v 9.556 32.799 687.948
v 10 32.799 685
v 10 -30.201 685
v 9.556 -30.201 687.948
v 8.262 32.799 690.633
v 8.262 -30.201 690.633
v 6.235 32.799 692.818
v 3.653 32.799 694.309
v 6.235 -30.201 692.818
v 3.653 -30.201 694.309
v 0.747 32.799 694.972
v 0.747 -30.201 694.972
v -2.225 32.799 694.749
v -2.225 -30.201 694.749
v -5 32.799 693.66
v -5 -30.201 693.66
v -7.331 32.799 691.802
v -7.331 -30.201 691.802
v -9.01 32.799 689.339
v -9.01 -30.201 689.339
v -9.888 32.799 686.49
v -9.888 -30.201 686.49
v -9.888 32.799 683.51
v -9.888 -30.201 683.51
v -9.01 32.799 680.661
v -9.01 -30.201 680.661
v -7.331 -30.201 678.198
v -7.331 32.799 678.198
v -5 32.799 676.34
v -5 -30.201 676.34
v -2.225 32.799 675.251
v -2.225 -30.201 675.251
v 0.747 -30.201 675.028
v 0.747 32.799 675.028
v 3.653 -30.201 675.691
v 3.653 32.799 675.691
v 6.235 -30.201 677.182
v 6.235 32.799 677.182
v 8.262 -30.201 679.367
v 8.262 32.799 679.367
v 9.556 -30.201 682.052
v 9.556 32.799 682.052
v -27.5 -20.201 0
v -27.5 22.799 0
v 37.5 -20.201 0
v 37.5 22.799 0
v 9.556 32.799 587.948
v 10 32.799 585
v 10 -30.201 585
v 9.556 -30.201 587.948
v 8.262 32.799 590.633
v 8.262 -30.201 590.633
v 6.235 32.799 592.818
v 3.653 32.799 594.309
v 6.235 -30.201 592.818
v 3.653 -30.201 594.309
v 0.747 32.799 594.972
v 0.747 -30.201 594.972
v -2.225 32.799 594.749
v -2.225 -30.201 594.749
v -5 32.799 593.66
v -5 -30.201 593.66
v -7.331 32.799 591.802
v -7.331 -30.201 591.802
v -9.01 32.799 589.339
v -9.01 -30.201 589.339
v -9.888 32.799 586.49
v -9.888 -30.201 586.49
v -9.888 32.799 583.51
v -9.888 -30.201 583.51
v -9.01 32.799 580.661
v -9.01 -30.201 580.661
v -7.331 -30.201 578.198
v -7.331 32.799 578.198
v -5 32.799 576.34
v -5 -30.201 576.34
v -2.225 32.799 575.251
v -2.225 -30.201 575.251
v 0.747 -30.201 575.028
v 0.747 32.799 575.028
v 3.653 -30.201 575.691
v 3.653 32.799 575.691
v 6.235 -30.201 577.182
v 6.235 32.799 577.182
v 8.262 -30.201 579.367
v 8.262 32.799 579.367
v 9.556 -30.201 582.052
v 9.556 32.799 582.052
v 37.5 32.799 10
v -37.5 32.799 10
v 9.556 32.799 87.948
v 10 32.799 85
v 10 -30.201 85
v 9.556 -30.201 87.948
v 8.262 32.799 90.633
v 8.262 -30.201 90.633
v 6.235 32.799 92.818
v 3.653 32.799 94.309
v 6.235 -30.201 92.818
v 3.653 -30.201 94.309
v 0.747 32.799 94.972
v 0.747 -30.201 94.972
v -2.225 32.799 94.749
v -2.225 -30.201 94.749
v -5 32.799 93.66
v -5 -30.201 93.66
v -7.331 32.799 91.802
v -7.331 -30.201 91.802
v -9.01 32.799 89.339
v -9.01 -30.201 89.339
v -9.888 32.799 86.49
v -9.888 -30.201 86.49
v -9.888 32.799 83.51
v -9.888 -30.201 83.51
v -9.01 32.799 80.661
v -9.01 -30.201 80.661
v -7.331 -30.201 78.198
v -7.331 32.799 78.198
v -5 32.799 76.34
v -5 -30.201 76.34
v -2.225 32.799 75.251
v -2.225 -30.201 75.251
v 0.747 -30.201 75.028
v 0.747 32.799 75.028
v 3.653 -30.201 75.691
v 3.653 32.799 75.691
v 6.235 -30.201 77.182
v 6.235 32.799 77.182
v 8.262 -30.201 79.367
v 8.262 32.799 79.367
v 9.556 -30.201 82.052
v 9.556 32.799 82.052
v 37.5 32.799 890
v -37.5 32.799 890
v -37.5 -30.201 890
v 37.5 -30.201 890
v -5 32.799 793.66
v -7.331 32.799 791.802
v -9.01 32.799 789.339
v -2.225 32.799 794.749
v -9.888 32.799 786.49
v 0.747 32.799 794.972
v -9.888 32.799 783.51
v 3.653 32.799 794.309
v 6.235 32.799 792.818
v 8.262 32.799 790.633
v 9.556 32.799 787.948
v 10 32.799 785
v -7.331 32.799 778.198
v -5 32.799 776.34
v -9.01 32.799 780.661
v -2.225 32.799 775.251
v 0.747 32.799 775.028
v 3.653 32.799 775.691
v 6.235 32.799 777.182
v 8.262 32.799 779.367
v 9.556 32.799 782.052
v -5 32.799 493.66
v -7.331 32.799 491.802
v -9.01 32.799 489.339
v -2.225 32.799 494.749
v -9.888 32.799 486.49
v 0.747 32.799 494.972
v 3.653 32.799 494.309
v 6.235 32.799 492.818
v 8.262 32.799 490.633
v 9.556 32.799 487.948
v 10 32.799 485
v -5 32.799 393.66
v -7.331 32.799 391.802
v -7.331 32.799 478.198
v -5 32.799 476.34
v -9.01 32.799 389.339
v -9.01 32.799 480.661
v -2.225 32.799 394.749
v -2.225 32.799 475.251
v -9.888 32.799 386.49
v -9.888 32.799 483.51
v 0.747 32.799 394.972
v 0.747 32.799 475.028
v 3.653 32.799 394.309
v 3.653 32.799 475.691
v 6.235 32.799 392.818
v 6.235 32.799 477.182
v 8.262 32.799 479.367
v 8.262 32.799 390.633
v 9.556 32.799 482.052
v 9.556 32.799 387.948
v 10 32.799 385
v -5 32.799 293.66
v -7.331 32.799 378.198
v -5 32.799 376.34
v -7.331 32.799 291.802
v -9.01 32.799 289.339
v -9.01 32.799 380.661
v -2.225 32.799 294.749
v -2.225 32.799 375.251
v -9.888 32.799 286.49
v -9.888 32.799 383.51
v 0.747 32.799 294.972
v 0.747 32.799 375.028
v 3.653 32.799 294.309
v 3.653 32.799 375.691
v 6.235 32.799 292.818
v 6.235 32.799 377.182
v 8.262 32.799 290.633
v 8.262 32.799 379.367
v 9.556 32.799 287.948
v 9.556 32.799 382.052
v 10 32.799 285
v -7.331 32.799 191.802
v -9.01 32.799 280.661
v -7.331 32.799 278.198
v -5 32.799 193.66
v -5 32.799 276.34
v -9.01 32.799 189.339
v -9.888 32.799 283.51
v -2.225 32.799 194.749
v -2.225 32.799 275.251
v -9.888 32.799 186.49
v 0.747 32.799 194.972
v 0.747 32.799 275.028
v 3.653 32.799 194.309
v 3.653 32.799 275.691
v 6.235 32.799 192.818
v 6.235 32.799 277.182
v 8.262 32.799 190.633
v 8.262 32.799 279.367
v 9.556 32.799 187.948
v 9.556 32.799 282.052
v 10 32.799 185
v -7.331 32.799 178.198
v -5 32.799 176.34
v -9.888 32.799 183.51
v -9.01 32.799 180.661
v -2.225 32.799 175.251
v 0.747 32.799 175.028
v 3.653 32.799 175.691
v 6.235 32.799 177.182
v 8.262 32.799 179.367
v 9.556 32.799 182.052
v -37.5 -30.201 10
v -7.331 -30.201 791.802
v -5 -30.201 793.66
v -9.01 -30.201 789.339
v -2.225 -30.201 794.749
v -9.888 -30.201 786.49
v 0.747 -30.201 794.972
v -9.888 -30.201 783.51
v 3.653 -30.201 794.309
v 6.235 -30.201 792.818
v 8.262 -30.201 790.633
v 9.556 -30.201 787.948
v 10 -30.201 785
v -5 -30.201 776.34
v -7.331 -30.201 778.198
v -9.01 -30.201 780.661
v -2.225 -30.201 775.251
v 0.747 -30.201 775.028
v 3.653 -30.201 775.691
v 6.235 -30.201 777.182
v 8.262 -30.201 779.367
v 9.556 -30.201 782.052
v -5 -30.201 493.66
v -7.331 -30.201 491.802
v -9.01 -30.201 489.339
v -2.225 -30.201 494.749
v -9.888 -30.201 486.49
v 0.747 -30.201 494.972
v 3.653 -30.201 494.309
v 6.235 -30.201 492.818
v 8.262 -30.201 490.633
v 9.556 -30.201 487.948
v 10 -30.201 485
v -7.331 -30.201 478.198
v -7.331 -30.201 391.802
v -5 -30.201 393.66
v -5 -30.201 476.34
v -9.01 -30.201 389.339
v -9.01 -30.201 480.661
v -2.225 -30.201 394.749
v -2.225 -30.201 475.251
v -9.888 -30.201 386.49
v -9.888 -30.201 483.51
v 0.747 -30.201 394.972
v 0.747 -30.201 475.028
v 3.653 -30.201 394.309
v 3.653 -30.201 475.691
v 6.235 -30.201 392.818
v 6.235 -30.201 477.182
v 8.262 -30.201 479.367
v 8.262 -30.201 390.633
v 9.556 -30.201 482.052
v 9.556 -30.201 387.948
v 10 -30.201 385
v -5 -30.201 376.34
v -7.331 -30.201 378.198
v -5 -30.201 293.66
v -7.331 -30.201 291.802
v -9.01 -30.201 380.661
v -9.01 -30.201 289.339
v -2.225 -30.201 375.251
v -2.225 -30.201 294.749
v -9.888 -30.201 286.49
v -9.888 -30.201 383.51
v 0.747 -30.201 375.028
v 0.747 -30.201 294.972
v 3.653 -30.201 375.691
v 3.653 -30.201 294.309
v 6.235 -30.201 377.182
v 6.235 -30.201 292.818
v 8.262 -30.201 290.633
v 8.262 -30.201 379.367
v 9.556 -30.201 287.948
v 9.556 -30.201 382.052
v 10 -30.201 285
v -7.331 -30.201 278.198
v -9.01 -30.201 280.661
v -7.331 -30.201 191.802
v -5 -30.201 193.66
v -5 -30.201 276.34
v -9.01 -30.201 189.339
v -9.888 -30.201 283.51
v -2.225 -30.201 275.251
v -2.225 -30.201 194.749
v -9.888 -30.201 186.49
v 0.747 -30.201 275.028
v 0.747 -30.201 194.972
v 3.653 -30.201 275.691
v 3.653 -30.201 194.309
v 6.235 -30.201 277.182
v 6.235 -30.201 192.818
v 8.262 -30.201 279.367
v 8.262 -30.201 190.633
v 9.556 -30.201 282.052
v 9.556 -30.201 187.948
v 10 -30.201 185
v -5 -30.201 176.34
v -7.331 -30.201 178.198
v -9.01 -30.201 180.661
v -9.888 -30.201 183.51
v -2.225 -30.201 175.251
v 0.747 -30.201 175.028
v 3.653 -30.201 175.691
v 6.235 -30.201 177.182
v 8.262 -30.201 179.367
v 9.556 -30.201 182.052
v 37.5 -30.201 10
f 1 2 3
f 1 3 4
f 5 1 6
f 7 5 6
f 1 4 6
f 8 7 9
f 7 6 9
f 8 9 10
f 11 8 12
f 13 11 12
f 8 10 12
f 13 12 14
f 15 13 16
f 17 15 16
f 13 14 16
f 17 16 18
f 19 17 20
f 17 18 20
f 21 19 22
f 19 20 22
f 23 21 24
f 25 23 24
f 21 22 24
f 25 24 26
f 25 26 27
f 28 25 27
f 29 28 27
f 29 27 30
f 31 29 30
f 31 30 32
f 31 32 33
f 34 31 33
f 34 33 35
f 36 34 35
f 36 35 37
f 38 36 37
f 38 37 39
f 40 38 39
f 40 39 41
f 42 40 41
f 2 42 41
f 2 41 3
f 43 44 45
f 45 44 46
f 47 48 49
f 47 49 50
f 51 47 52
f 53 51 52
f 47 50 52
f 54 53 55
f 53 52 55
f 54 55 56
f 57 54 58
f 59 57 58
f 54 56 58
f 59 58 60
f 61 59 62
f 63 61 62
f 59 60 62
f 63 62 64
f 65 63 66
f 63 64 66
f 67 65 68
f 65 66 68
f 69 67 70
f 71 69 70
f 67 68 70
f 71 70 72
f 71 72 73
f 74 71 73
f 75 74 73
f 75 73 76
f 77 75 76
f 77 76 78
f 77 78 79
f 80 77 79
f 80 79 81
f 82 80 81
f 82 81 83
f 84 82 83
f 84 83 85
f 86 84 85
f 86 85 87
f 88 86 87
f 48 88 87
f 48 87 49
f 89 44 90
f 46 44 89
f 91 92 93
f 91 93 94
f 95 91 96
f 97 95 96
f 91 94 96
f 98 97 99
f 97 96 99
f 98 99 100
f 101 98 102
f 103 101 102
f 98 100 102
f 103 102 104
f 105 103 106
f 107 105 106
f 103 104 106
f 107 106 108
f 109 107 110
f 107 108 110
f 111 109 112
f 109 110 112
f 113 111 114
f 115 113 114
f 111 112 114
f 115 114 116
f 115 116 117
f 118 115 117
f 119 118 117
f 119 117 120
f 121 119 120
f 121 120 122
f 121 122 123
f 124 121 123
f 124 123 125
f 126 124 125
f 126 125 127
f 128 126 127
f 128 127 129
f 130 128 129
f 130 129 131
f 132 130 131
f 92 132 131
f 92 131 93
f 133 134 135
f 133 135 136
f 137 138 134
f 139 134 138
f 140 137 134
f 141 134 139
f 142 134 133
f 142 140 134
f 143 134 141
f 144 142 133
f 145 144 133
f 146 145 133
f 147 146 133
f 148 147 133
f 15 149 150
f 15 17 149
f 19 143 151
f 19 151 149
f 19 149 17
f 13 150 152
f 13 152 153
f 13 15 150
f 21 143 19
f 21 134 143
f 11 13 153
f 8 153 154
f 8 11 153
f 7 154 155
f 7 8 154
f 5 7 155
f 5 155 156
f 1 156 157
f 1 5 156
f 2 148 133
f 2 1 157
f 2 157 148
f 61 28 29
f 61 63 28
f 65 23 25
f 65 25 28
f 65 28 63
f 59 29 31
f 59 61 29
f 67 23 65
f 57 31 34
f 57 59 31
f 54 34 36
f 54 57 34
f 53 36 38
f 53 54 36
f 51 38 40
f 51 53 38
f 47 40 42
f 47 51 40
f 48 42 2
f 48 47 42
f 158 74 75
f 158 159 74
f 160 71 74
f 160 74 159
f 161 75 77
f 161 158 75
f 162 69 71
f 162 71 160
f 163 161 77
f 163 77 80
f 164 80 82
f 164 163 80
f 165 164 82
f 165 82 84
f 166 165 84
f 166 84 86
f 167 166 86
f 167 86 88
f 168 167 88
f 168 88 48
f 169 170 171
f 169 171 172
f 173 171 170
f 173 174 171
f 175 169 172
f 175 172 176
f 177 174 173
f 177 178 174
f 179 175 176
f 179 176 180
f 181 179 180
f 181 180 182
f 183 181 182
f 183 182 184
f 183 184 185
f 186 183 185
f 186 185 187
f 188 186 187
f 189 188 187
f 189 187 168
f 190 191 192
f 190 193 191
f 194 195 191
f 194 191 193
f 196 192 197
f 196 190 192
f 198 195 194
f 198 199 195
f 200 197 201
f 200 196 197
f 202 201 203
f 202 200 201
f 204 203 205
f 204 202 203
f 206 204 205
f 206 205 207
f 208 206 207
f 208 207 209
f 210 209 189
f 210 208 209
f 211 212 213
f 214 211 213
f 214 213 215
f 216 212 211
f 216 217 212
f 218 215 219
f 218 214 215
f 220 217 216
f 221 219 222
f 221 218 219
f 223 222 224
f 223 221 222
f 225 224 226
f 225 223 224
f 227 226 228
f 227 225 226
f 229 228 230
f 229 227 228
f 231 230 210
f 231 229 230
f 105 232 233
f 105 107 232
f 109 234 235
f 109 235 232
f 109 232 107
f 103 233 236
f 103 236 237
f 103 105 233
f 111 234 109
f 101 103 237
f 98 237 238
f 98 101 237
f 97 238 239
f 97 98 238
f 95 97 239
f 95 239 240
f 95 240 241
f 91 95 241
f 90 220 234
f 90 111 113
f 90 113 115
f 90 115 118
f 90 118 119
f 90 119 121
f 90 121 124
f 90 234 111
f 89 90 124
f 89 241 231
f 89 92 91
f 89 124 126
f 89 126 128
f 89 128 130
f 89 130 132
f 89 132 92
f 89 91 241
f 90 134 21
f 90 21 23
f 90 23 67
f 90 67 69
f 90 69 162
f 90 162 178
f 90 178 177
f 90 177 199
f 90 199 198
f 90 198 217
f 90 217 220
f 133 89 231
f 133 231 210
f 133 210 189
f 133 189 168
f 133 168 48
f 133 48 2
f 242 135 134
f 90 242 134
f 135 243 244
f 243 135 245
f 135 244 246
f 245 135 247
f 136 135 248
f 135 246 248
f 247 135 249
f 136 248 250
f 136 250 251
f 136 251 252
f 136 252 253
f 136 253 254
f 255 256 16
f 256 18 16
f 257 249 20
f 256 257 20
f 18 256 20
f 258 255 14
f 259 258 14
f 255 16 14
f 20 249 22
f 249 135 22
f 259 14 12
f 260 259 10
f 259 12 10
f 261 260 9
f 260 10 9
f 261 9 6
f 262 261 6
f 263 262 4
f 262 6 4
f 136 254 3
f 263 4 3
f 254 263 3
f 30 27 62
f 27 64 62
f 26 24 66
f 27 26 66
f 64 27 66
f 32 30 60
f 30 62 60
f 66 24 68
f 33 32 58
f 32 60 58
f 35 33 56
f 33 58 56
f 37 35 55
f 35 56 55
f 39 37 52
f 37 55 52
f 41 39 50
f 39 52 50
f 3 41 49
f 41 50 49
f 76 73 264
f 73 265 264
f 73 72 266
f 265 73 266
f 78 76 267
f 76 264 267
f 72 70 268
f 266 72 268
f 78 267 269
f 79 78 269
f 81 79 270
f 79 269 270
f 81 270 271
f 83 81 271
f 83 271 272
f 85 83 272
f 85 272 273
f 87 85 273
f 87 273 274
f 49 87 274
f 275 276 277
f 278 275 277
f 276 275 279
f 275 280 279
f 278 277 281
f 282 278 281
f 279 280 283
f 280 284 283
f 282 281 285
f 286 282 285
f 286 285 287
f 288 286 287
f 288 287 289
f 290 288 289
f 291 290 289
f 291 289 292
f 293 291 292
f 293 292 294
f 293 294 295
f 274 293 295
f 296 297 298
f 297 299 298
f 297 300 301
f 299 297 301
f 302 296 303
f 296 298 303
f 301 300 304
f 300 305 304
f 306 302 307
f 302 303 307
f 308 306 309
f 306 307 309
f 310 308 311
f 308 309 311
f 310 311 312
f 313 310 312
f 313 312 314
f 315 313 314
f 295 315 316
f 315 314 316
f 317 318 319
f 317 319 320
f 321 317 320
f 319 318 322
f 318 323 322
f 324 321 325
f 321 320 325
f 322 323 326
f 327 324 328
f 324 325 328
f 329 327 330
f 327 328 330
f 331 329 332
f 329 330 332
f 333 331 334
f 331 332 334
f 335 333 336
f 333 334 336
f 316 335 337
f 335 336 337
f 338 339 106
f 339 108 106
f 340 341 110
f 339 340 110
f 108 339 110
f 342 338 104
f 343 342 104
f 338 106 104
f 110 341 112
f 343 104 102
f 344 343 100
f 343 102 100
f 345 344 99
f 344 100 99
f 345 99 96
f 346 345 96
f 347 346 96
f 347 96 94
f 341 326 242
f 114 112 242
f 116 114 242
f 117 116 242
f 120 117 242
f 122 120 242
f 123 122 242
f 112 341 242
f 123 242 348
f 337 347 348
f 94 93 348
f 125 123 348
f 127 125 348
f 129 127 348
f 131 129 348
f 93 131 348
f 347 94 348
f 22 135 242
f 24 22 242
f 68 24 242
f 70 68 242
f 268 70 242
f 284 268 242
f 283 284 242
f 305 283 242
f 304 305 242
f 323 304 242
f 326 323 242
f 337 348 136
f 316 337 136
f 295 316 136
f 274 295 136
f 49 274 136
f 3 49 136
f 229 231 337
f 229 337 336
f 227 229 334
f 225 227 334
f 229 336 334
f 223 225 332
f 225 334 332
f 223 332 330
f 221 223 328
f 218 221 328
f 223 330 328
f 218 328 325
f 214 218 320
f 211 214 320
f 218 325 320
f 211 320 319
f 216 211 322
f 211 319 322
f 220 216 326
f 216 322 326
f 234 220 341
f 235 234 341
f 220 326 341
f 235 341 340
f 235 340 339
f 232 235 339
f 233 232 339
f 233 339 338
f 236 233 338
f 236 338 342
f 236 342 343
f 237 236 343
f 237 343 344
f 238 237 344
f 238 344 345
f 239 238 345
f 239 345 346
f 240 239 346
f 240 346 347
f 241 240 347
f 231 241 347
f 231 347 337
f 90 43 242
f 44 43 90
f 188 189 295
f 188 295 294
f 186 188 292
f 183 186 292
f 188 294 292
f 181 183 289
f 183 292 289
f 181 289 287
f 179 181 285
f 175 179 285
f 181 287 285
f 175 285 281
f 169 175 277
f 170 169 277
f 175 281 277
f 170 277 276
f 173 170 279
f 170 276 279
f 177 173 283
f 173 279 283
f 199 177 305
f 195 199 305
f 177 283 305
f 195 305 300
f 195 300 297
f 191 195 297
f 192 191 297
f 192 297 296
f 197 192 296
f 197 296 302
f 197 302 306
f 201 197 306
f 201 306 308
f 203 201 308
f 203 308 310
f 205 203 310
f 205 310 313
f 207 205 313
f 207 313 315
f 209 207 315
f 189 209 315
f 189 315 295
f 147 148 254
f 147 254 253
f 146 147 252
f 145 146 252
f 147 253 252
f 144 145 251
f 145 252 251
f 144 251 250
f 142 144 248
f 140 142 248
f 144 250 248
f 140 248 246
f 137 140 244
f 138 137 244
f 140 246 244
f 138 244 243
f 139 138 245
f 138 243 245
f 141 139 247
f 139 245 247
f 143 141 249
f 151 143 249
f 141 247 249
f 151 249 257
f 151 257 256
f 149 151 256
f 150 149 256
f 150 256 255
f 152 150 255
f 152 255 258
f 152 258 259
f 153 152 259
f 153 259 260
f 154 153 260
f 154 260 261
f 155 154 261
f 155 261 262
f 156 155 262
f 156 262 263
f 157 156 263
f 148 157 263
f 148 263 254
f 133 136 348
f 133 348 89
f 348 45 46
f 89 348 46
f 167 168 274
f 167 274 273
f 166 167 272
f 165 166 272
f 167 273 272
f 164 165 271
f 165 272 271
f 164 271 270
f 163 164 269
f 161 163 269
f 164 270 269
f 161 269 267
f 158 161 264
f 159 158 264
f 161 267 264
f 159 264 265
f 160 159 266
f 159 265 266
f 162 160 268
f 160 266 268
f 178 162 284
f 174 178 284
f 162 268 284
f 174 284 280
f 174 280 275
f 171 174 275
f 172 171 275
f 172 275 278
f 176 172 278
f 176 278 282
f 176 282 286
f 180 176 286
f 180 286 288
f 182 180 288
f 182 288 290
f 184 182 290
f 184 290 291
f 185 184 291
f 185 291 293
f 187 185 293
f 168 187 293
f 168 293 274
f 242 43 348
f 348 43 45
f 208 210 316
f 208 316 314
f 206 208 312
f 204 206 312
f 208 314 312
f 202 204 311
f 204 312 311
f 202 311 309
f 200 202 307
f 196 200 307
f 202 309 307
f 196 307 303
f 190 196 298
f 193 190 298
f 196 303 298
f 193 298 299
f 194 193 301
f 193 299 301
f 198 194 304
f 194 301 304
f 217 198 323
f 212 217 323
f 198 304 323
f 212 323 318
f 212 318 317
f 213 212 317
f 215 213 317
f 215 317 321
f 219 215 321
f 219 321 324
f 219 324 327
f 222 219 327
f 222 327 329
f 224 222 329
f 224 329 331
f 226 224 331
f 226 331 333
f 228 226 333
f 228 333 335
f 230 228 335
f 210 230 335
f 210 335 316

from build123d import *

# Parameters (mm, degrees)
F0_W     = 75
F0_H     = 63
F1_DEPTH = 890
F2_R     = 10
F3_DEPTH = 63.001
F4_SIZE  = 10


with BuildPart() as f1:
    # F0 (on Top) → F1 (new body)
    with BuildSketch(Plane.XY):
        with Locations((0, 1.299331)):
            Rectangle(F0_W, F0_H)
    extrude(amount=F1_DEPTH)

    # F2 (on face) → F3 (cut, through all)
    with BuildSketch(Plane.XZ.offset(30.200669)):
        with Locations((0, 85)):
            Circle(F2_R)
        with Locations((0, 185)):
            Circle(F2_R)
        with Locations((0, 285)):
            Circle(F2_R)
        with Locations((0, 385)):
            Circle(F2_R)
        with Locations((0, 485)):
            Circle(F2_R)
        with Locations((0, 585)):
            Circle(F2_R)
        with Locations((0, 685)):
            Circle(F2_R)
        with Locations((0, 785)):
            Circle(F2_R)
    extrude(amount=-F3_DEPTH, mode=Mode.SUBTRACT)

    # F4
    f4_edges = [f1.edges().sort_by_distance(p)[0] for p in [
        (0, 32.799331, 0),
        (-37.5, 1.299331, 0),
        (0, -30.200669, 0),
    ]]
    chamfer(f4_edges, length=F4_SIZE)


solid = f1.part
